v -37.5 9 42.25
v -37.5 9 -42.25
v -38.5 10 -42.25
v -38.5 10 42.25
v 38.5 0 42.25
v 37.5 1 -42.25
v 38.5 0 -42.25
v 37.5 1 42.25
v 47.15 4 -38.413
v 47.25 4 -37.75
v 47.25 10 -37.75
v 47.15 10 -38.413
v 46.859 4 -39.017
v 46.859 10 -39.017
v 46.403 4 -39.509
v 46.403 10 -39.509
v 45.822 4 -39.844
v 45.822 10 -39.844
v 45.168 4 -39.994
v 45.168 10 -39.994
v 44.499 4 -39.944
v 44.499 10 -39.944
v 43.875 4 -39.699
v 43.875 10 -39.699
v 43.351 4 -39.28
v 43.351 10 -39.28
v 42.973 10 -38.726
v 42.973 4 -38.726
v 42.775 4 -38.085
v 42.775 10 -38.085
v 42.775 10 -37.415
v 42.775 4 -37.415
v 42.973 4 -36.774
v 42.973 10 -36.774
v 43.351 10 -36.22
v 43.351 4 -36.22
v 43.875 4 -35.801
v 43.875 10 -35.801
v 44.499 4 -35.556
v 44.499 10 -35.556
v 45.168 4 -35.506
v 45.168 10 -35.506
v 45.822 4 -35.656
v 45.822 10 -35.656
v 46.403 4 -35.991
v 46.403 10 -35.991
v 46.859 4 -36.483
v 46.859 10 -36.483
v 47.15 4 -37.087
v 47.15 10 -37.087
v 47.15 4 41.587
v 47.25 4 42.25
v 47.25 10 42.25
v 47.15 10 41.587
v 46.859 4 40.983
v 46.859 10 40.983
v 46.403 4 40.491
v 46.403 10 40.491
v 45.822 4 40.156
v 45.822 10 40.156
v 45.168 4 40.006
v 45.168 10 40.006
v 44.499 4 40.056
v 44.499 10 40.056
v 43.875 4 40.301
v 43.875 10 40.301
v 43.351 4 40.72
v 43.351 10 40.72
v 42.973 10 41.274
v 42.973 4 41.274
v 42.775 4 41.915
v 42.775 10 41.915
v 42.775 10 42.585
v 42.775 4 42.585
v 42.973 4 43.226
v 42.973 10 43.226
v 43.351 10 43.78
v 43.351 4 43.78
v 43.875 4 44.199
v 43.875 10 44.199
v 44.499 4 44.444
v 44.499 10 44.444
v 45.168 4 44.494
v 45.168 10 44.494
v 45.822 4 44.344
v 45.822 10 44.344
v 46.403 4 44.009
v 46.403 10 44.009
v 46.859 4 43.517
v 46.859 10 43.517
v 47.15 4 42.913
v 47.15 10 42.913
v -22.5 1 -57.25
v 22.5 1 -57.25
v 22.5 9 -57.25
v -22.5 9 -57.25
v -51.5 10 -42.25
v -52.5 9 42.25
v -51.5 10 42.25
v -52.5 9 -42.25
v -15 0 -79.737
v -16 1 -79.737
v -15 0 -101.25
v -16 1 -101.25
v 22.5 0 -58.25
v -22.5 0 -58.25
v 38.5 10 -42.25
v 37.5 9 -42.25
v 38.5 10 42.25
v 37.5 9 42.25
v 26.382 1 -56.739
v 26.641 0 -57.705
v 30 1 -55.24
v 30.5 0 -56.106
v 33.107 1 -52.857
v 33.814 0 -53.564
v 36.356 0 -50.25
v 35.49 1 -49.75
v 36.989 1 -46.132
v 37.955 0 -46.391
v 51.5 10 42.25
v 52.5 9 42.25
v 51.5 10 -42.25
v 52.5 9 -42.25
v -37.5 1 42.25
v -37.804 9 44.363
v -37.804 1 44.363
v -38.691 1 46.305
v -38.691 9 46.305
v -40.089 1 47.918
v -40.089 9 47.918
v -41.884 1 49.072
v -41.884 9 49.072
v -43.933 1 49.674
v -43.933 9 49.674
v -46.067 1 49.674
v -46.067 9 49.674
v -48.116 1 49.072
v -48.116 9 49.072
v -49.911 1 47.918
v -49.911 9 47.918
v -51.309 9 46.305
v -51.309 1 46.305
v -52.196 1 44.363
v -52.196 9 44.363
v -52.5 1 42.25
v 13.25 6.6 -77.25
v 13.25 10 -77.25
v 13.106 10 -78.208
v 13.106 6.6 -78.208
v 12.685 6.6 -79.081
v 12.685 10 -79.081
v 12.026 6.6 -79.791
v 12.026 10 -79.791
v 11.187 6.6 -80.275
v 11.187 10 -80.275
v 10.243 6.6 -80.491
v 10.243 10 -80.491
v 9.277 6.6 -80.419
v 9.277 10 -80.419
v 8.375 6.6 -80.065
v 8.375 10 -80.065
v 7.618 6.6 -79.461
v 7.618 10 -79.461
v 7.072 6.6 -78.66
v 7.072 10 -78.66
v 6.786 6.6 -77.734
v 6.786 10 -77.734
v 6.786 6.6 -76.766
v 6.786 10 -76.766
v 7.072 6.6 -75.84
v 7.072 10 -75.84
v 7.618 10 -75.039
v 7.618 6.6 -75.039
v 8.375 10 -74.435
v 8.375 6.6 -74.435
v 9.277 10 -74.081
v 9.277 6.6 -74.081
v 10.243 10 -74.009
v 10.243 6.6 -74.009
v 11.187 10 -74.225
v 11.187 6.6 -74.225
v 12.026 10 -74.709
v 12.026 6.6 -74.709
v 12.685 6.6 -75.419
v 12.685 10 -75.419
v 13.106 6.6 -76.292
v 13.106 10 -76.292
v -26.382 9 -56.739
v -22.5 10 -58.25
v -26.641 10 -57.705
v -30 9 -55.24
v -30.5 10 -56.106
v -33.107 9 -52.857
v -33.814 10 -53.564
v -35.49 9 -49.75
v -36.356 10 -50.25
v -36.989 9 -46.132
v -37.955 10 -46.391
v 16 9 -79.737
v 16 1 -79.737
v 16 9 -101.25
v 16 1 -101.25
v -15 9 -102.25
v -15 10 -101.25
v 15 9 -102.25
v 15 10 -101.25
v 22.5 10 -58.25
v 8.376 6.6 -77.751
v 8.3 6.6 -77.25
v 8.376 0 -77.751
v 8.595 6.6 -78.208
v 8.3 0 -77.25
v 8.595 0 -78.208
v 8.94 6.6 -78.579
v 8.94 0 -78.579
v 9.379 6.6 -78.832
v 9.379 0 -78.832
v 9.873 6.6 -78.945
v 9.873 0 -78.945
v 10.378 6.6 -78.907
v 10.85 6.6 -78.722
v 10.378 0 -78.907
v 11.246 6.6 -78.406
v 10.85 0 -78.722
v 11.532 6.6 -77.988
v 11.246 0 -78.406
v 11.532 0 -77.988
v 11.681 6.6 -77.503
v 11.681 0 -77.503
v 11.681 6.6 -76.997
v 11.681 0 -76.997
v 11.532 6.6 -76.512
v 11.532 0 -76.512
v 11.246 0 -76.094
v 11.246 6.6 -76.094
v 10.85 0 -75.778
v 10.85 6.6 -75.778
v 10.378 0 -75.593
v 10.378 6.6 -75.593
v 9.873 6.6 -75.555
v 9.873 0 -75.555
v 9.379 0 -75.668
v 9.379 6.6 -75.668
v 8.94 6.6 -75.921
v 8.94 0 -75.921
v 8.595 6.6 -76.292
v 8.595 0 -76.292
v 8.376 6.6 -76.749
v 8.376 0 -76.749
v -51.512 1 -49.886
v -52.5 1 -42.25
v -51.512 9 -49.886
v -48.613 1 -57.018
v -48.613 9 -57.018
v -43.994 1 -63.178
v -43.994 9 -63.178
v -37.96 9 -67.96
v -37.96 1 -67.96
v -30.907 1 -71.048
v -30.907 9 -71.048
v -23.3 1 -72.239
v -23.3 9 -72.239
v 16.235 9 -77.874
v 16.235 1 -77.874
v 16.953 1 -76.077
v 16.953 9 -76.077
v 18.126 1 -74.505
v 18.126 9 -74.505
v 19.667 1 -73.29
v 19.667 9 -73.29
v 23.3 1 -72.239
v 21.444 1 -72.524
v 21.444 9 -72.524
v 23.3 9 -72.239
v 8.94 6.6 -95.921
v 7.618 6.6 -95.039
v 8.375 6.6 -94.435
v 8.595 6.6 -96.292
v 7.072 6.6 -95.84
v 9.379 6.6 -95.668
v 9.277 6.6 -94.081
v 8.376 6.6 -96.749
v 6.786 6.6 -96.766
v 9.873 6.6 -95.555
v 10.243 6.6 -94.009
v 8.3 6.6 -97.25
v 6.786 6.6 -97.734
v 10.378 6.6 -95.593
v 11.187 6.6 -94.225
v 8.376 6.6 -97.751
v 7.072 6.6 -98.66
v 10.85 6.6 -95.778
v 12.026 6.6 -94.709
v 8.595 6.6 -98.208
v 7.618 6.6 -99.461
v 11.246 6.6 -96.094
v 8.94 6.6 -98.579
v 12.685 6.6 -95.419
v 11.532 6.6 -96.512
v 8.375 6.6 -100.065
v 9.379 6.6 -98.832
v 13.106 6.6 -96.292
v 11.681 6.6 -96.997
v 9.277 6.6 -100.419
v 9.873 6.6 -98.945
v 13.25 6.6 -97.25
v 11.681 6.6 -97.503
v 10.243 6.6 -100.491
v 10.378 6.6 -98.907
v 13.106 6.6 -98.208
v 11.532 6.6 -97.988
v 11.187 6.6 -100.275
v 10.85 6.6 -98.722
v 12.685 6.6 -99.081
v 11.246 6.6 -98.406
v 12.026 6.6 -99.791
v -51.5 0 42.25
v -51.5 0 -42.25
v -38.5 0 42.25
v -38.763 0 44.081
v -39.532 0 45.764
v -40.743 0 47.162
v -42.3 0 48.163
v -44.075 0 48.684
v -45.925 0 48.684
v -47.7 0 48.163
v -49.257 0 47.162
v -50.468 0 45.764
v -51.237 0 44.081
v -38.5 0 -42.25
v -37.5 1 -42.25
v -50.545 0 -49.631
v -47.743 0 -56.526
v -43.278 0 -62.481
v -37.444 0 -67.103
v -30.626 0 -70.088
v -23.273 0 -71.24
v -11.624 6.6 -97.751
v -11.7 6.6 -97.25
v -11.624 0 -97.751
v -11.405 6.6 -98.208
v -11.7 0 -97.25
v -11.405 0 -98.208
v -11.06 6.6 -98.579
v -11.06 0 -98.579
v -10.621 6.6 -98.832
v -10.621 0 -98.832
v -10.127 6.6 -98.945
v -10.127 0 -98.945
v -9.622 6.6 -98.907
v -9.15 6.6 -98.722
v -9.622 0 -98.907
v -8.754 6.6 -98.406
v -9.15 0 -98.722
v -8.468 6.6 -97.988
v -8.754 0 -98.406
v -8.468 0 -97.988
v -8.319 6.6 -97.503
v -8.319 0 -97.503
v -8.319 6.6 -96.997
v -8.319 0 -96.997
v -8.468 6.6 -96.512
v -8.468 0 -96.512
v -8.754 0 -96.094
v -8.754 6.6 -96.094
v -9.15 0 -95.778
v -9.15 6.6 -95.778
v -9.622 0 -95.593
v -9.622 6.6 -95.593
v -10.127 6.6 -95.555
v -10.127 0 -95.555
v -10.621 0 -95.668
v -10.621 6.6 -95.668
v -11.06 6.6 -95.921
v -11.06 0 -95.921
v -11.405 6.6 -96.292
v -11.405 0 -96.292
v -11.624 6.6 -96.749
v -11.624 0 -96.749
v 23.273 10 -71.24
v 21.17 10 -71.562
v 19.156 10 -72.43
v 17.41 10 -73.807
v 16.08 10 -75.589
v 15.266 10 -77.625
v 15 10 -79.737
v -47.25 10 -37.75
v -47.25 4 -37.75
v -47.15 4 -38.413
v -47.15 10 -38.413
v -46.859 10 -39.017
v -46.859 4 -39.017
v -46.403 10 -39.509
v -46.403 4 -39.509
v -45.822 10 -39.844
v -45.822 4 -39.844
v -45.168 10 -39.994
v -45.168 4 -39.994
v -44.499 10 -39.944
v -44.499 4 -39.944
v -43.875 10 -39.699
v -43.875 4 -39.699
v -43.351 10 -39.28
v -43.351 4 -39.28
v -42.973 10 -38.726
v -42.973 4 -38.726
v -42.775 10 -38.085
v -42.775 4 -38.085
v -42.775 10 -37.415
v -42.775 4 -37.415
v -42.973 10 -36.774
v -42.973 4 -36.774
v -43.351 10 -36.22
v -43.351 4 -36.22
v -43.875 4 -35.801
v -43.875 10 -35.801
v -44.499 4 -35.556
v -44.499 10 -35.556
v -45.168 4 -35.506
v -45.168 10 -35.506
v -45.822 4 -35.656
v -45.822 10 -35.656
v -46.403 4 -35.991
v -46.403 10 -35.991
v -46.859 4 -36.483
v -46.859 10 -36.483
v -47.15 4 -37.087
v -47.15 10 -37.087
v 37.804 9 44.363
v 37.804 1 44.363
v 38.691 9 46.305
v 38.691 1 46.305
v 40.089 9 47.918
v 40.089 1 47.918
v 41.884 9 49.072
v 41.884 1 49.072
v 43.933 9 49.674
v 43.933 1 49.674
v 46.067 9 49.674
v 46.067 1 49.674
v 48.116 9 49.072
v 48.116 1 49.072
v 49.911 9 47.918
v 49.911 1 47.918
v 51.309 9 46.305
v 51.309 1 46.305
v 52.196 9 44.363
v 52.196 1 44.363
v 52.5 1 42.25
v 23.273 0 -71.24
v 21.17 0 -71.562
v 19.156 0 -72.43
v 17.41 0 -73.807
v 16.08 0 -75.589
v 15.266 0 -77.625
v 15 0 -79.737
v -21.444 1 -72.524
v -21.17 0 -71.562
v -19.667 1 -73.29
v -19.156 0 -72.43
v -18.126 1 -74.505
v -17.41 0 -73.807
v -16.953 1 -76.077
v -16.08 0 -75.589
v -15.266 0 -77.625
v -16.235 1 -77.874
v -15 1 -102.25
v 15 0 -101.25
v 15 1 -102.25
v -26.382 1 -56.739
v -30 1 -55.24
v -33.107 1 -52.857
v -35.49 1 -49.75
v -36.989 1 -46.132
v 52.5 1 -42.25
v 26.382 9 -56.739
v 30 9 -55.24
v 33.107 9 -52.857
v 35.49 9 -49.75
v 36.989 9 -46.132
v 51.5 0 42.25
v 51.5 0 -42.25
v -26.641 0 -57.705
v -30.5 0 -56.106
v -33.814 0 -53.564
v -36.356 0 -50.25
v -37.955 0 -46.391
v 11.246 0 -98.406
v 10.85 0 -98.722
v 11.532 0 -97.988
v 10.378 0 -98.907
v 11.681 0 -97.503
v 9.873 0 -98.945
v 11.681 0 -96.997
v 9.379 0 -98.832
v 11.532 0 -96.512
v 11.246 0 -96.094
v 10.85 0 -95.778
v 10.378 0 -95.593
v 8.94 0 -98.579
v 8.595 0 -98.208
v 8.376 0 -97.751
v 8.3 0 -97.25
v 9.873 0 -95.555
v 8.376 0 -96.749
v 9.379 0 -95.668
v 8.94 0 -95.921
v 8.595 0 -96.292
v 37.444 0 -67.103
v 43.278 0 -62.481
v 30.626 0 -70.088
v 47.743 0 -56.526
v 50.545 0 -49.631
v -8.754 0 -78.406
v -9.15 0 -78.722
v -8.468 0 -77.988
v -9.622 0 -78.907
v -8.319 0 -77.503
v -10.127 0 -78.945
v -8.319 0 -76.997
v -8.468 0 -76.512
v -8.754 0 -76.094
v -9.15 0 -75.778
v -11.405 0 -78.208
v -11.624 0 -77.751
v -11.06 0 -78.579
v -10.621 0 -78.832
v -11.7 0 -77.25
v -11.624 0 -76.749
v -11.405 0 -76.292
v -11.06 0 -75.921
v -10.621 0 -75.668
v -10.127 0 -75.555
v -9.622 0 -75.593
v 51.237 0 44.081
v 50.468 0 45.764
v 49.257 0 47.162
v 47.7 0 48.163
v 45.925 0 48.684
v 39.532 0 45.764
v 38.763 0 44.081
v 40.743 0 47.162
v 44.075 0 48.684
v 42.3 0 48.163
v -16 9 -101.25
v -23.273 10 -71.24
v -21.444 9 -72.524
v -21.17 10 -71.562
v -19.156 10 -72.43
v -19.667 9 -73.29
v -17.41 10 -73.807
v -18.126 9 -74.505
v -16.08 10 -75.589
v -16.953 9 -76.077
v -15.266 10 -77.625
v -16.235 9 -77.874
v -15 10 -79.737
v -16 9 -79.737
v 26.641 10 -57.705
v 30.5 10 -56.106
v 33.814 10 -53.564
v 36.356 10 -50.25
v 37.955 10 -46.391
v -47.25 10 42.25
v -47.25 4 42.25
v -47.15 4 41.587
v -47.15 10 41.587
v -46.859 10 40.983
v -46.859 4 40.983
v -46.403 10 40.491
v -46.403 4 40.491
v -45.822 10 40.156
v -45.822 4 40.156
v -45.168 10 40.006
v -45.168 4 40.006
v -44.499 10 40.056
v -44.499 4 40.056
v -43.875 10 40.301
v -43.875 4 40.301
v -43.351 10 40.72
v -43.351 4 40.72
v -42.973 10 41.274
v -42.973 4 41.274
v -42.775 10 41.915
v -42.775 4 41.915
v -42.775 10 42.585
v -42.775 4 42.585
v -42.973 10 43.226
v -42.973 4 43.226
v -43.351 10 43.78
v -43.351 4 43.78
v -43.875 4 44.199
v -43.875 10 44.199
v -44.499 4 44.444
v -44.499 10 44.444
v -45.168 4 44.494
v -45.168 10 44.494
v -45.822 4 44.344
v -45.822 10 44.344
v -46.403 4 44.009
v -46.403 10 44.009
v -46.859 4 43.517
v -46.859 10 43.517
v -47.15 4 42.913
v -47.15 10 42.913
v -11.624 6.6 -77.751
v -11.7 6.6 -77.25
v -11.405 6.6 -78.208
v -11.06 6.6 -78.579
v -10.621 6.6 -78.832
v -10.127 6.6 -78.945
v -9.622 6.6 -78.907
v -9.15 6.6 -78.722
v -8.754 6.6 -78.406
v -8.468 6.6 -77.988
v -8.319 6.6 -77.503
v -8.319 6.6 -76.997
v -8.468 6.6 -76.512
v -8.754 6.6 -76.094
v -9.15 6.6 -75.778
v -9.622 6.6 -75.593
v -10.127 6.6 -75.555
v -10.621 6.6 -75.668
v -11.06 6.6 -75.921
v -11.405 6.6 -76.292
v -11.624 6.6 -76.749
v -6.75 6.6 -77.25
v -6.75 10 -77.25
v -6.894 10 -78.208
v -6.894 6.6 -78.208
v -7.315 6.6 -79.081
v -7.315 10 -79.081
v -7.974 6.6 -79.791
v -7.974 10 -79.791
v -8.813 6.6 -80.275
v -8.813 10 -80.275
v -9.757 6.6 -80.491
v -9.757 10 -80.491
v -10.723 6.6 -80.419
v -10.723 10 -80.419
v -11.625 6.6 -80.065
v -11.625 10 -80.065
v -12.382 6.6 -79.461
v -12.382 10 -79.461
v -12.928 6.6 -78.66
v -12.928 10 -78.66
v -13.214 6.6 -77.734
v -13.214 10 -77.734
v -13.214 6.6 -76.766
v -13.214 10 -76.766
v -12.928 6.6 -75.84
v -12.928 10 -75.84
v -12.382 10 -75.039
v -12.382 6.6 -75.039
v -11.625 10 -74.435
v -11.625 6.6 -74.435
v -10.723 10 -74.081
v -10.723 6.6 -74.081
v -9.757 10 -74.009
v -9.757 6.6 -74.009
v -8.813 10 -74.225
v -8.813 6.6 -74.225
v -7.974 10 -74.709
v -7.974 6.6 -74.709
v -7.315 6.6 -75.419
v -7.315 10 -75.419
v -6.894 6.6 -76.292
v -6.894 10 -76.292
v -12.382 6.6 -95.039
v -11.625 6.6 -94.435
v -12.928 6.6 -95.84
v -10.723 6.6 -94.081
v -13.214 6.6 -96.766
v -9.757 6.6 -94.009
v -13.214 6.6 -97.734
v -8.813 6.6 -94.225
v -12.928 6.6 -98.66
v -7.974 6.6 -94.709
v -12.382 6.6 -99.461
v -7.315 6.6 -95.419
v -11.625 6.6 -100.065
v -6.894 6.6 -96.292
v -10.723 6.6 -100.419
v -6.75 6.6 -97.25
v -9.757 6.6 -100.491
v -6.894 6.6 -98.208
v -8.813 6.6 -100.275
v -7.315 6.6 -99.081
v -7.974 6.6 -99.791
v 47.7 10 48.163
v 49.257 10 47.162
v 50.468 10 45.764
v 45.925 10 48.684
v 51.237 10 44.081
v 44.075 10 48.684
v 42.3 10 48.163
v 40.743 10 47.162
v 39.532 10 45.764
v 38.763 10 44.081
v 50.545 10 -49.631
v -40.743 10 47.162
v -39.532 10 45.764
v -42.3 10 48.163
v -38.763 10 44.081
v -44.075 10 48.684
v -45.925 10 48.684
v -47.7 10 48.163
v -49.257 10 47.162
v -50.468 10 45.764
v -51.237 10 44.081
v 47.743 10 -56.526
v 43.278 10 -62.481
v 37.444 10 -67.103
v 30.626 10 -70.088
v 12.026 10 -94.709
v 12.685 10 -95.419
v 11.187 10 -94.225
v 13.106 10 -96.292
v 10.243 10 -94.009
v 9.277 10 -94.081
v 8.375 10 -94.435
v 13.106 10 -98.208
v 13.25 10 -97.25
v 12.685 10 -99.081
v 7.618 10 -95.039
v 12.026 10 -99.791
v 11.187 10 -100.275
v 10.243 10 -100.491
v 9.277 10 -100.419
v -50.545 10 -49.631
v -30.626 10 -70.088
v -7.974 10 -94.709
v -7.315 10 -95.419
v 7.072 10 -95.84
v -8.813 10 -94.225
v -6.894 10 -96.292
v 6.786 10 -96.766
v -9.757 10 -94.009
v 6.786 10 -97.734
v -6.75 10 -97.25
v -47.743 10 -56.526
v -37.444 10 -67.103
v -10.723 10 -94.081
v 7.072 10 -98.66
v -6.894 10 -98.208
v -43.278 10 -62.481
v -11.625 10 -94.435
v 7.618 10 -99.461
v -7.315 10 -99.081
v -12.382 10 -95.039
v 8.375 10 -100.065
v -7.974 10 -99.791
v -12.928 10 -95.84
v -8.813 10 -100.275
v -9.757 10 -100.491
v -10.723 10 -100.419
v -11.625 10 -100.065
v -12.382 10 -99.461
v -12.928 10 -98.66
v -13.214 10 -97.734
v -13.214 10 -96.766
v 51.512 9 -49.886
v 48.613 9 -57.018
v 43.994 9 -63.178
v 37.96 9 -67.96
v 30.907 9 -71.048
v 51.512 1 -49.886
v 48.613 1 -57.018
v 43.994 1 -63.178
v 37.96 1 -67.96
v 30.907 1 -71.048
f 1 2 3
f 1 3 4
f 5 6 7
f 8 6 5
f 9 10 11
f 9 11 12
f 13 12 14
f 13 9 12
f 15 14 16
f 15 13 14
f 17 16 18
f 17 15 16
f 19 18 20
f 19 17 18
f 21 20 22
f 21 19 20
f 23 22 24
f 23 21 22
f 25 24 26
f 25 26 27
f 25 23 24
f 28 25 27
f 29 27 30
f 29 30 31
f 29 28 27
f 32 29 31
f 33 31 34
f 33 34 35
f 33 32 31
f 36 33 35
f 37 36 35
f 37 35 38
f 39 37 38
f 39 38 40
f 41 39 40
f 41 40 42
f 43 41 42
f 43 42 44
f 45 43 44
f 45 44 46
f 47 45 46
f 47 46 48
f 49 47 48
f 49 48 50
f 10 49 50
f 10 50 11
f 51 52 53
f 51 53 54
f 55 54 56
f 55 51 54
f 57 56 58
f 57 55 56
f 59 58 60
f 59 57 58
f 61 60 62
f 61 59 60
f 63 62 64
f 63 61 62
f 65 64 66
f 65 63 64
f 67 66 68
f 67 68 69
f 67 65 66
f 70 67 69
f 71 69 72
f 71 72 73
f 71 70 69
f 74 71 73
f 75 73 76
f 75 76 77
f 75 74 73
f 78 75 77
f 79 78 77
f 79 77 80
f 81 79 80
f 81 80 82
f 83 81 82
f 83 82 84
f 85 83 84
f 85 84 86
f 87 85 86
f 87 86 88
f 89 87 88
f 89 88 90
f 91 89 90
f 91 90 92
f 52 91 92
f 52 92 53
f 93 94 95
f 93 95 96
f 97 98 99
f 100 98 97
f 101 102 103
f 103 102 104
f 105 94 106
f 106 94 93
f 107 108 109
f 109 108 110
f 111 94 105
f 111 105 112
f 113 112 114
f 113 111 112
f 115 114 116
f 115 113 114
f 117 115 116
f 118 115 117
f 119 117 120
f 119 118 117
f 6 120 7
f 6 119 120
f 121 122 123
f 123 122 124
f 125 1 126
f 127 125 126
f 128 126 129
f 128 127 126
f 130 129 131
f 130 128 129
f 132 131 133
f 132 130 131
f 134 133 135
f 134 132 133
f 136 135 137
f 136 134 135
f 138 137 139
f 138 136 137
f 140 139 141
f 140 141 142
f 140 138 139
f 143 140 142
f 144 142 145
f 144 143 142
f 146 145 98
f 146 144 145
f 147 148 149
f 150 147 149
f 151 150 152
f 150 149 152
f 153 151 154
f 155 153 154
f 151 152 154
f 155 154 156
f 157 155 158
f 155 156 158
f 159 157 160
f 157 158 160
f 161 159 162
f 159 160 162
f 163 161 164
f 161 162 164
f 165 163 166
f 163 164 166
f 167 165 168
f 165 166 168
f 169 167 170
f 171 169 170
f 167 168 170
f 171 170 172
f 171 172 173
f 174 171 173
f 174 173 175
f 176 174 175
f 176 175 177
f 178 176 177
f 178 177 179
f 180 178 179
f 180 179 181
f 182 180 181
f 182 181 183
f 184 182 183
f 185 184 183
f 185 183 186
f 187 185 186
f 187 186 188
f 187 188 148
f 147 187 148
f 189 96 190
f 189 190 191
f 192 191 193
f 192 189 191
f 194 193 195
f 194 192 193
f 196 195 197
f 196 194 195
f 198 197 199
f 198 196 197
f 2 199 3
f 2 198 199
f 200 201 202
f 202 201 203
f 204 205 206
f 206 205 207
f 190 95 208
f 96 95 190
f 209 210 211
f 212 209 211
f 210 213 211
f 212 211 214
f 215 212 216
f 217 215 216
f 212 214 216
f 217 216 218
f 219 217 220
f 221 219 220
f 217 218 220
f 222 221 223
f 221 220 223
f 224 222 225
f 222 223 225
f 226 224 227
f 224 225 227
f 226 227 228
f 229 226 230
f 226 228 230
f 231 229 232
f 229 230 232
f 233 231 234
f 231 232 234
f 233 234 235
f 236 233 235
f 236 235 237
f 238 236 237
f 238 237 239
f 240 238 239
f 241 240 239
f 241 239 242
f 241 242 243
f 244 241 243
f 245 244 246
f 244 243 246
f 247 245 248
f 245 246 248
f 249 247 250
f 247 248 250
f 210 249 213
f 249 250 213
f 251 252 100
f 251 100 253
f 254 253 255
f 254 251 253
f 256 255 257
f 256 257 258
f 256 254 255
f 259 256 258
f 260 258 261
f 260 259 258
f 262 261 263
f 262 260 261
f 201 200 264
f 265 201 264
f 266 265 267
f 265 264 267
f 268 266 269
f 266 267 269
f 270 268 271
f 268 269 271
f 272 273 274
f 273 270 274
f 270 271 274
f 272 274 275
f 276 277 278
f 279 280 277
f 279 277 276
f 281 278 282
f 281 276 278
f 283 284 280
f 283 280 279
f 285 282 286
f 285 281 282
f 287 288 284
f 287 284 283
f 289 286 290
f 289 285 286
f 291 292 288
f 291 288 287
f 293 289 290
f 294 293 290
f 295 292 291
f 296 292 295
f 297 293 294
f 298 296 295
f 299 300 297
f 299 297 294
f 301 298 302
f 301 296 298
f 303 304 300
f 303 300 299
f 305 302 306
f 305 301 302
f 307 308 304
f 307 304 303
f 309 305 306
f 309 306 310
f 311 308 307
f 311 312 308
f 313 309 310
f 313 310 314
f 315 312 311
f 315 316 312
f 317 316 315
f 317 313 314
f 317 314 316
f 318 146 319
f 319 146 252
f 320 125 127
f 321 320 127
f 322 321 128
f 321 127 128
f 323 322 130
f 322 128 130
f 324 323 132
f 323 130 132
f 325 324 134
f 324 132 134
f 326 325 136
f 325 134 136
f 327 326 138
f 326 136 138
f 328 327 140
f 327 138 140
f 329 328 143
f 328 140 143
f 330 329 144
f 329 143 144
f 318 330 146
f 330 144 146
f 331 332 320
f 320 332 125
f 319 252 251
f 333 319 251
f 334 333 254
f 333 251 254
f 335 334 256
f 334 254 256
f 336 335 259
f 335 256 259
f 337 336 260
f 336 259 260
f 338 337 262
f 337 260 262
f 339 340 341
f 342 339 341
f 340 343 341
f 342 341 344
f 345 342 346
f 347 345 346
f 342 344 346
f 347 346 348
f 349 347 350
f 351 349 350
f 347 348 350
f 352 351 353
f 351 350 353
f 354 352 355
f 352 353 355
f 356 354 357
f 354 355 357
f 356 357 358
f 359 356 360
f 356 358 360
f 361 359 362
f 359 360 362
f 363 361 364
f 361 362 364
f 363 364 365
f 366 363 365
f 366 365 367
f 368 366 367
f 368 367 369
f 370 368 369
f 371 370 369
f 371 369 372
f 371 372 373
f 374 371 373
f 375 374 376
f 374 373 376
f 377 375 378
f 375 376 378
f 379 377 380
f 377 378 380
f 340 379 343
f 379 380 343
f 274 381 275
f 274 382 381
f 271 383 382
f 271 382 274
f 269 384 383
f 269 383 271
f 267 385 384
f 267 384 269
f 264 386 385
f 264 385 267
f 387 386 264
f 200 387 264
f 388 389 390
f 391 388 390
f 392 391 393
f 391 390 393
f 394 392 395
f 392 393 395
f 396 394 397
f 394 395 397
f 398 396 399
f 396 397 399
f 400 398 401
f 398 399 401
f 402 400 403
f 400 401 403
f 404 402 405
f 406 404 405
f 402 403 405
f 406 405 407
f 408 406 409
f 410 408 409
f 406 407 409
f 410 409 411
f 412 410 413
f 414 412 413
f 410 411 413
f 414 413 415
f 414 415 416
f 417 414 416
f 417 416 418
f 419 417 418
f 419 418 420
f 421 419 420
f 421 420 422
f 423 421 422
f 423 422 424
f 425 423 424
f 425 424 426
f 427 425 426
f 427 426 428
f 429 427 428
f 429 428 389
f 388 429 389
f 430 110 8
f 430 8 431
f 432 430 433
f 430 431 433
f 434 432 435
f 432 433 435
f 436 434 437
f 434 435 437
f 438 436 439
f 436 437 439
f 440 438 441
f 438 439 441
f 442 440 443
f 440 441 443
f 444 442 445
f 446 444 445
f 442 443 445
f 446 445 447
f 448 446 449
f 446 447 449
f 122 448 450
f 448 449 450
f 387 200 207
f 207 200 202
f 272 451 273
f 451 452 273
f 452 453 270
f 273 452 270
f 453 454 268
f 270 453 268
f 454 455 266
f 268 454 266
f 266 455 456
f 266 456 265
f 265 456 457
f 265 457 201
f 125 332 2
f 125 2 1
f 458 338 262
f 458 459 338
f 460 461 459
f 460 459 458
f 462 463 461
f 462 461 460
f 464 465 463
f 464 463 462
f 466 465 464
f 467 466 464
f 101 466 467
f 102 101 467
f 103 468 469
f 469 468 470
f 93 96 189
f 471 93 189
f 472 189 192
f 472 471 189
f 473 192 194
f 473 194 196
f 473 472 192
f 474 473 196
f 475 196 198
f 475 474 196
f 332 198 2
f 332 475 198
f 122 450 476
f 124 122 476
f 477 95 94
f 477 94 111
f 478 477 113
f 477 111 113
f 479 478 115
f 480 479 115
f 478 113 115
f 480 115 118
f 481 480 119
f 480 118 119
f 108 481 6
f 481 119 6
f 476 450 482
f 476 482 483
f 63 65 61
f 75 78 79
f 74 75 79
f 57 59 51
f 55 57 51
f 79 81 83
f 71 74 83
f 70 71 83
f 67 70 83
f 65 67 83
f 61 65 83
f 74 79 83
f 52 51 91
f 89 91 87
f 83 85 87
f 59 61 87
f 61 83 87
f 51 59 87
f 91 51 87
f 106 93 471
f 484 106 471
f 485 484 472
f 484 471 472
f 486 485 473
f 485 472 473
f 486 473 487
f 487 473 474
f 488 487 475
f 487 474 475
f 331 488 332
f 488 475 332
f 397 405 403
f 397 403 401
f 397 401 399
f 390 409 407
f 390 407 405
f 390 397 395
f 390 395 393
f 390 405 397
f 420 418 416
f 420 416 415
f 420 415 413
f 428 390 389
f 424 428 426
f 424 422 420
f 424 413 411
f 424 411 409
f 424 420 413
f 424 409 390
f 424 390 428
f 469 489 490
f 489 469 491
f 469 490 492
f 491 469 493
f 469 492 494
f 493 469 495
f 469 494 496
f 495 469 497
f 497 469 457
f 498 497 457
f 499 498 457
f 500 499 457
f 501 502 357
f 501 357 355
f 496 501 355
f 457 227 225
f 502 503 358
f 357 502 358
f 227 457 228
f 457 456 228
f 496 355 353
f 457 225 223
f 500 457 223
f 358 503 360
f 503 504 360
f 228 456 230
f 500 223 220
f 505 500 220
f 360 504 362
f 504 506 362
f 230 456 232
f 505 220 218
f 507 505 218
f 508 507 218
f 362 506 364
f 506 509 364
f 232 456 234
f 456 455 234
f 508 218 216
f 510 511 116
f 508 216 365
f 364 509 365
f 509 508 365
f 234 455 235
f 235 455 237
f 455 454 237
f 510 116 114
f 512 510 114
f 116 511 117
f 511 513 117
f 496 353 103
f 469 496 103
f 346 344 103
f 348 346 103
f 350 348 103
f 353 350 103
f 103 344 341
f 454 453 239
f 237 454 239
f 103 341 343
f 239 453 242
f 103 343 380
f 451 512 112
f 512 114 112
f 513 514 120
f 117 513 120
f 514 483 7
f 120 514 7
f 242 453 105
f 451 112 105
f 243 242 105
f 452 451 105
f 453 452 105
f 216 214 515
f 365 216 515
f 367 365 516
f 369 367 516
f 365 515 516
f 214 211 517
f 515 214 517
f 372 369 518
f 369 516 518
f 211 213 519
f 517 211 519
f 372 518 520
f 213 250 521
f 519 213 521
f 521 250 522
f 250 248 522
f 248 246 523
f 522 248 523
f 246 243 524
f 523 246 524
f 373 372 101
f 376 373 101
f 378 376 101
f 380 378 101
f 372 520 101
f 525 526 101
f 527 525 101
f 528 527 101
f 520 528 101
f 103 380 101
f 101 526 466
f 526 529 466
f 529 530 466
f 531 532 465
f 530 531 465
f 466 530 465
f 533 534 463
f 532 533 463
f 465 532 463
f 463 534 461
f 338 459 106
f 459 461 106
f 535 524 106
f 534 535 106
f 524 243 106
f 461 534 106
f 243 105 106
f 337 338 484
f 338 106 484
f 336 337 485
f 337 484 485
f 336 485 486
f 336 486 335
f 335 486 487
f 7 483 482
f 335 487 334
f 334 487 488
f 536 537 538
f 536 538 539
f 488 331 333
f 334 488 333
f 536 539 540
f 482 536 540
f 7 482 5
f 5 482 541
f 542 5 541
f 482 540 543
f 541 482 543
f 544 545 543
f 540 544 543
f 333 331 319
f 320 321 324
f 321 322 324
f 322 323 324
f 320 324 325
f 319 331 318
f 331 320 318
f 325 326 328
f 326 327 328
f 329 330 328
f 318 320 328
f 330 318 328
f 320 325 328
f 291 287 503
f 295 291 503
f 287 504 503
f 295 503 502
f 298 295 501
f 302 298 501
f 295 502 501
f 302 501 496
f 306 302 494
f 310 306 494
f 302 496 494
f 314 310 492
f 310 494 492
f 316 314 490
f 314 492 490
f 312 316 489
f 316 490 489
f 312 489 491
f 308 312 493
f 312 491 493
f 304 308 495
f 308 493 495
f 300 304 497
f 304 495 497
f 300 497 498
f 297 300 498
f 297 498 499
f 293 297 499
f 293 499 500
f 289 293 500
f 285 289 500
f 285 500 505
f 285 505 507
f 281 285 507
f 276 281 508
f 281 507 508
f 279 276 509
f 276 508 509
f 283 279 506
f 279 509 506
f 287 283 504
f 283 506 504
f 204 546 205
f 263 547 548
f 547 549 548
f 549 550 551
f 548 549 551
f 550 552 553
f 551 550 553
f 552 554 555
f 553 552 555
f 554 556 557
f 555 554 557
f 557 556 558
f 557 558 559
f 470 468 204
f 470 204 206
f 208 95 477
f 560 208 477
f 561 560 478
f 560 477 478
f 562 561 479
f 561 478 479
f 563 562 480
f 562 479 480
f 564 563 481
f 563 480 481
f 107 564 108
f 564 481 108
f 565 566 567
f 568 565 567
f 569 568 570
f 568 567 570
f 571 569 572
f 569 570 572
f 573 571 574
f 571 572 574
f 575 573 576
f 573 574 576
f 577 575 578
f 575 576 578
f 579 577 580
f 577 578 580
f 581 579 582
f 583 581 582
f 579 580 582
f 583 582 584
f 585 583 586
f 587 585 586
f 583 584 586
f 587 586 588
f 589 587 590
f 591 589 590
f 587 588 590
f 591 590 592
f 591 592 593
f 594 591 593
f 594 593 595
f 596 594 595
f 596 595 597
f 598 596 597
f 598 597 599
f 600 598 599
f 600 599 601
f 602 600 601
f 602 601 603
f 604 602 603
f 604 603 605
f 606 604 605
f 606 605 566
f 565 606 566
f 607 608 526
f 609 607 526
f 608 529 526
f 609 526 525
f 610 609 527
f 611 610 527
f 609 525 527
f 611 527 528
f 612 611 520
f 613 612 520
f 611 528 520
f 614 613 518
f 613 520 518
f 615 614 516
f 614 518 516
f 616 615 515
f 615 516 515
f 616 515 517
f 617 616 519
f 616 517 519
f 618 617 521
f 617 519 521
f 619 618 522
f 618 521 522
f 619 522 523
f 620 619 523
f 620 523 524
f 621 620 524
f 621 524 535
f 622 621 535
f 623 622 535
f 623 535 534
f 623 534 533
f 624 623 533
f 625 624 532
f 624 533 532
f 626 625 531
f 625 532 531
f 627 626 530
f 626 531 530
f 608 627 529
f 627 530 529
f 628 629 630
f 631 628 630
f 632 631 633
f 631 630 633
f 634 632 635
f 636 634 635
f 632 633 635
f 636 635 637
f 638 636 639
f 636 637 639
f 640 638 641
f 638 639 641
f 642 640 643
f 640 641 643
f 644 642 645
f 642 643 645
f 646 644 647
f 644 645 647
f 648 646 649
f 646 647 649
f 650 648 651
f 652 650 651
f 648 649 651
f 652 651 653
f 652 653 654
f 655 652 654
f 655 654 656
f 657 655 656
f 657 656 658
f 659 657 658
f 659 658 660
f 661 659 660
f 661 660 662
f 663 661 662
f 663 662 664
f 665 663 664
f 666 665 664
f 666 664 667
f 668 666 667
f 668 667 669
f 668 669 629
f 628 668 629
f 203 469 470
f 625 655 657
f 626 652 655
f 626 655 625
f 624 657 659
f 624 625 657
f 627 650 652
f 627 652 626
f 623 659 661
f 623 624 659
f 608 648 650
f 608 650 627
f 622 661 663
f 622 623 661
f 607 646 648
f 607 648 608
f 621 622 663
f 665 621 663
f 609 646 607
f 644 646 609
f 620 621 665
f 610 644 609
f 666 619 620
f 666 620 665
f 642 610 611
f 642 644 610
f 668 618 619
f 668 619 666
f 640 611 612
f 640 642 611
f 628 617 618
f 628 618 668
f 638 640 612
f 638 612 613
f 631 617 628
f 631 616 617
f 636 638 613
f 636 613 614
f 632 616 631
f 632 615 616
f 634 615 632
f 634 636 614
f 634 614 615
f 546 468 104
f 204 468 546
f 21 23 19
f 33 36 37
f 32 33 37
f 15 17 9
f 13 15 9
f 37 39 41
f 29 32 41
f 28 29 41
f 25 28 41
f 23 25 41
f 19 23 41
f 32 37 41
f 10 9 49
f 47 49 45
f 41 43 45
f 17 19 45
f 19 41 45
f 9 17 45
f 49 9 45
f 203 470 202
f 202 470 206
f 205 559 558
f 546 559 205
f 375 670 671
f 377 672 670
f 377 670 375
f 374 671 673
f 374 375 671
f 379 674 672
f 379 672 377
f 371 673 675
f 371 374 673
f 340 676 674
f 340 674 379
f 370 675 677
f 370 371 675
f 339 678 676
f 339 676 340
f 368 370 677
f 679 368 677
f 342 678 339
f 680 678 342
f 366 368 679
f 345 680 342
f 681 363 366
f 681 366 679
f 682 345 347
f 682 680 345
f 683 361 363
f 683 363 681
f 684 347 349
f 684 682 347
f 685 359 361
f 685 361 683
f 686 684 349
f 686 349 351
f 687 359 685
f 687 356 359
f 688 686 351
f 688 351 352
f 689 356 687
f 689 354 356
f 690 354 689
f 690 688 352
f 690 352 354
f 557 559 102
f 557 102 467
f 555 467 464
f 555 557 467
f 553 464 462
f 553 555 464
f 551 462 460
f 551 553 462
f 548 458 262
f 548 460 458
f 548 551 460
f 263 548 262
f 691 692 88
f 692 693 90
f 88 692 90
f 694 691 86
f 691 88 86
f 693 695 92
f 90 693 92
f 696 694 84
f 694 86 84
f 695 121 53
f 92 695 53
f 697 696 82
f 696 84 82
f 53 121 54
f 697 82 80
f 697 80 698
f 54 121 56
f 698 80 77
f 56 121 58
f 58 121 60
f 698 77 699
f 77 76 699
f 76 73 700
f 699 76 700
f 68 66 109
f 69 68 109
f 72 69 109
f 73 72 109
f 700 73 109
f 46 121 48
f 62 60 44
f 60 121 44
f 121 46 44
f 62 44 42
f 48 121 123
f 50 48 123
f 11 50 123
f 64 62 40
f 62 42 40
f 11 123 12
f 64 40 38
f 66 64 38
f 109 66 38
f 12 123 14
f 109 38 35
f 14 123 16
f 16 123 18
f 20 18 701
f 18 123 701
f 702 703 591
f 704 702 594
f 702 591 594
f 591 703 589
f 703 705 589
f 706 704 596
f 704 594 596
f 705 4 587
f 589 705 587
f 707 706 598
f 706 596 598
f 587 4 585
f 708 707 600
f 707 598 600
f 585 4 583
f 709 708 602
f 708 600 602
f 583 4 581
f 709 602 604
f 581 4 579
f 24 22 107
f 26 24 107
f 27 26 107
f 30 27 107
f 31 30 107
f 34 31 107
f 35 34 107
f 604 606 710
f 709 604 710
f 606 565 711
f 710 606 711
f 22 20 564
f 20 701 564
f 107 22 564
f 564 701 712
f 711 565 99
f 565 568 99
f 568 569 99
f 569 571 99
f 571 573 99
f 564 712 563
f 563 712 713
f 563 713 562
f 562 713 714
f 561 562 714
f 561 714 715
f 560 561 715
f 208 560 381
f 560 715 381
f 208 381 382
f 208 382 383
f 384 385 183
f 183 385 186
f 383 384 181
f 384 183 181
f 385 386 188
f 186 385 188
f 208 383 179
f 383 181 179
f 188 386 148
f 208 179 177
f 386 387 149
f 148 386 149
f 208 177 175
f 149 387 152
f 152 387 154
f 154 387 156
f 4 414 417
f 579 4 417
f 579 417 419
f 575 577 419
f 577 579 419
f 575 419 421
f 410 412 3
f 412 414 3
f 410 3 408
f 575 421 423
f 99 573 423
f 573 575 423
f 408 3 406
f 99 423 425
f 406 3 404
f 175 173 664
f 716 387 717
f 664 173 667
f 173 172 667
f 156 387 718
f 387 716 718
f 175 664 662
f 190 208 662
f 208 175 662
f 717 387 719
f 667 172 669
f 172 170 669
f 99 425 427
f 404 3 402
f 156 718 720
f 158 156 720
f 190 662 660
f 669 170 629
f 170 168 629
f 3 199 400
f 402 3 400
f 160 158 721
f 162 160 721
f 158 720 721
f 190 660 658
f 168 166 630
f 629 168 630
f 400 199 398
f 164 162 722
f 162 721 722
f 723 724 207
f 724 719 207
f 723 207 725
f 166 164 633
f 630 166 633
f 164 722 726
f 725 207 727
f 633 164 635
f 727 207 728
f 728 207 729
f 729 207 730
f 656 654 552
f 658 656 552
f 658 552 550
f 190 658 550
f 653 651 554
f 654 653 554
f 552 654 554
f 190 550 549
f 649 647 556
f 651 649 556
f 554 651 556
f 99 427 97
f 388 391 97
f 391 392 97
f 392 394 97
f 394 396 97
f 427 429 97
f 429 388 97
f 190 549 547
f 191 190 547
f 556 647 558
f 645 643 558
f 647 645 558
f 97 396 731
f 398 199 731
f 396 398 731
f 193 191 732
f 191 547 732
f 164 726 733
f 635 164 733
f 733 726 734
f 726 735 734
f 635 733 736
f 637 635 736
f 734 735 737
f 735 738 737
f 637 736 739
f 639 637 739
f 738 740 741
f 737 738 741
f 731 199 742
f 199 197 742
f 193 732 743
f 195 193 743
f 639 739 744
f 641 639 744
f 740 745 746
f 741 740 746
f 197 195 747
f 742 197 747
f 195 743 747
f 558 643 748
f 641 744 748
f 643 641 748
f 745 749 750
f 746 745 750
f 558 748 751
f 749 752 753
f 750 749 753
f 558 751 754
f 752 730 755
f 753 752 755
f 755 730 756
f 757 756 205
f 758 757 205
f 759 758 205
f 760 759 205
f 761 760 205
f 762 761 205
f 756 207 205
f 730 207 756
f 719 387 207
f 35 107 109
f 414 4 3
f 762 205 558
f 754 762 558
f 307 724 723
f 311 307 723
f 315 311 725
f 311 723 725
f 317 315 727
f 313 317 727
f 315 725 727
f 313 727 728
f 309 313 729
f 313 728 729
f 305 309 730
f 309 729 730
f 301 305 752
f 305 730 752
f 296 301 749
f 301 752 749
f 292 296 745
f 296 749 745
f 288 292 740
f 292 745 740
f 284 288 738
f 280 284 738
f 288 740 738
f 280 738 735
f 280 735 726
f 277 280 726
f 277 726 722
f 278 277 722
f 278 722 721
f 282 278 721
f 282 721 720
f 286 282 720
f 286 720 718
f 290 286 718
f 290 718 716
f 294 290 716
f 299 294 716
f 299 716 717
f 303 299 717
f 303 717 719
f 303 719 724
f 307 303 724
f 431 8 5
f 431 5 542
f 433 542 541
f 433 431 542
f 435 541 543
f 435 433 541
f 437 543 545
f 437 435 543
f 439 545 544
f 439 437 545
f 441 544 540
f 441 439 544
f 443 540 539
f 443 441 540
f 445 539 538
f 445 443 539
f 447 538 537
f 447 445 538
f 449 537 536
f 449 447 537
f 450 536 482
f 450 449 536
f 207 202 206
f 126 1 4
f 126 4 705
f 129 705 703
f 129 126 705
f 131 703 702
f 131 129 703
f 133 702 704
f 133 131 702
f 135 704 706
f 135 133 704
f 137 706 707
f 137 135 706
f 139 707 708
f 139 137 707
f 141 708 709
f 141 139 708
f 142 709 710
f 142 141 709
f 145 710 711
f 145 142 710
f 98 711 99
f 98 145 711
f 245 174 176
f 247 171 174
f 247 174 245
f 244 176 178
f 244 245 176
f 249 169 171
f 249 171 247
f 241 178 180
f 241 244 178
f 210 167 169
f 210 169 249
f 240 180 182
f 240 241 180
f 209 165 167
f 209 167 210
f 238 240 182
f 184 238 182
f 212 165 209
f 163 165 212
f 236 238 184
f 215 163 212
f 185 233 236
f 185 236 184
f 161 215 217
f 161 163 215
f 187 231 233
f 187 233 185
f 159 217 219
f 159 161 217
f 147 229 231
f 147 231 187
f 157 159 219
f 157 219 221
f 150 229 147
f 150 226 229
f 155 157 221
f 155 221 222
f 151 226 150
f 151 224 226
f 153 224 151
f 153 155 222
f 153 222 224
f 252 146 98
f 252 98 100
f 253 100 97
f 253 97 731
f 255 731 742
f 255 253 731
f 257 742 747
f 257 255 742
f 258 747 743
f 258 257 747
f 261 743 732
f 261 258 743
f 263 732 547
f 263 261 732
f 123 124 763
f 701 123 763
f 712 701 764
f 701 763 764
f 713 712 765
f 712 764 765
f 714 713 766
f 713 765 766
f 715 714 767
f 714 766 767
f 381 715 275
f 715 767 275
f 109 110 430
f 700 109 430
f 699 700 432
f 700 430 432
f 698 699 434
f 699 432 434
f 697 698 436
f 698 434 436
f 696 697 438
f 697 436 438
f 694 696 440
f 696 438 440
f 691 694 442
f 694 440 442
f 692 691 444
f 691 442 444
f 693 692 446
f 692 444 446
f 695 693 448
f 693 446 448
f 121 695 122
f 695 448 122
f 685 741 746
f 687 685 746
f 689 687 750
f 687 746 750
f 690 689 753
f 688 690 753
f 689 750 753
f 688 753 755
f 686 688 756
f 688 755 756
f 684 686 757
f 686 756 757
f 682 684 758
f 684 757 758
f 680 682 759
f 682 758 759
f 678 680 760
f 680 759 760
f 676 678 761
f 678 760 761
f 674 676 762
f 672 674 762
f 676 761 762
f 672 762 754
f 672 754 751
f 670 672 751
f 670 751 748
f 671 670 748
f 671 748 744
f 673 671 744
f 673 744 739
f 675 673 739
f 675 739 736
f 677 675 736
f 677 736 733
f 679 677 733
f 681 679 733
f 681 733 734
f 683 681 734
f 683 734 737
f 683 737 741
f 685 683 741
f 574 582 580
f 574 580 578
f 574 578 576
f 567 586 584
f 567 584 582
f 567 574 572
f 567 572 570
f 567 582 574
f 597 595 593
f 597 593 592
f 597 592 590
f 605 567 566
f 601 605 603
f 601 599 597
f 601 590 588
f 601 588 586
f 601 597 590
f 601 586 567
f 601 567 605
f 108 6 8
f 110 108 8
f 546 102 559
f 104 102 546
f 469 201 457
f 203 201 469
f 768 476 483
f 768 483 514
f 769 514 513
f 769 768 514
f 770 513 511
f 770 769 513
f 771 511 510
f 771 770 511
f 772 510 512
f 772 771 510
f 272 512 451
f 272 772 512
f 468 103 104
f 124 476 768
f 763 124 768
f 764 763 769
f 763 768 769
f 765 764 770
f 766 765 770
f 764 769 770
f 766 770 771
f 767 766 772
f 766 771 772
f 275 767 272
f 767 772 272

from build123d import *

# Parameters (mm, degrees)
SKETCH1_R                                           = 2.25
BOSS_EXTRUDE1_DEPTH                                 = 10
FILLET1_R                                           = 7.5
CHAMFER1_SIZE                                       = 1
SKETCH5_R                                           = 2.25
BOSS_EXTRUDE2_DEPTH                                 = 4
CBORE_FOR_M3_HEX_SOCKET_HEAD_CAP_SCREW1_D           = 3.4
CBORE_FOR_M3_HEX_SOCKET_HEAD_CAP_SCREW1_CBORE_D     = 6.5
CBORE_FOR_M3_HEX_SOCKET_HEAD_CAP_SCREW1_CBORE_DEPTH = 3.4


with BuildPart() as part:
    # Sketch1 → Boss-Extrude1 (new body)
    with BuildSketch(Plane(origin=(0, 0, 0), x_dir=(1, 0, 0), z_dir=(0, 1, 0))):
        with BuildLine():
            Line((0, 57.25), (22.5, 57.25))
            ThreePointArc((22.5, 57.25), (33.106601718, 52.856601718), (37.5, 42.25))
            Line((37.5, 42.25), (37.5, -42.25))
            ThreePointArc((37.5, -42.25), (45, -49.75), (52.5, -42.25))
            Line((52.5, -42.25), (52.5, 42.25))
            ThreePointArc((52.5, 42.25), (43.713203436, 63.463203436), (22.5, 72.25))
            Line((22.5, 72.25), (16, 72.25))
            Line((16, 72.25), (16, 102.25))
            Line((16, 102.25), (0, 102.25))
            Line((0, 102.25), (0, 57.25))
        make_face()
        with Locations((45, -42.25)):
            Circle(SKETCH1_R, mode=Mode.SUBTRACT)
        with Locations((45, 37.75)):
            Circle(SKETCH1_R, mode=Mode.SUBTRACT)
    extrude(amount=BOSS_EXTRUDE1_DEPTH)

    # Fillet1
    fillet1_edges = [part.edges().sort_by_distance(p)[0] for p in [
        (16, 5, -72.25),
    ]]
    fillet(fillet1_edges, radius=FILLET1_R)

    # Chamfer1
    chamfer1_edges = [part.edges().sort_by_distance(p)[0] for p in [
        (8, 0, -102.25),
        (43.99418526, 0, -63.178449536),
        (52.5, 0, 0),
        (45, 0, 49.75),
        (37.5, 0, 0),
        (33.106601718, 10, -52.856601718),
        (33.106601718, 0, -52.856601718),
        (11.25, 0, -57.25),
        (37.5, 10, 0),
        (16, 5, -102.25),
        (45, 10, 49.75),
        (52.5, 10, 0),
        (43.99418526, 10, -63.178449536),
        (16, 0, -90.993332148),
        (16, 10, -90.993332148),
        (8, 10, -102.25),
        (18.126453685, 0, -74.504551911),
        (18.126453685, 10, -74.504551911),
        (11.25, 10, -57.25),
    ]]
    chamfer(chamfer1_edges, length=CHAMFER1_SIZE)

    # Sketch5 → Boss-Extrude2 (add)
    with BuildSketch(Plane.XZ):
        with Locations((45, -37.75)):
            Circle(SKETCH5_R)
        with Locations((45, 42.25)):
            Circle(SKETCH5_R)
    extrude(amount=-BOSS_EXTRUDE2_DEPTH)

    # Mirror1: part across plane


with BuildPart() as part_1:
    add(part.part)
    add(part.part.mirror(Plane(origin=(0, 10, -57.25), x_dir=(0, 0, 1), z_dir=(1, 0, 0))))

    # CBORE for M3 Hex Socket Head Cap Screw1 (through all)
    with Locations(Plane(origin=(0, 10, 0), x_dir=(1, 0, 0), z_dir=(0, 1, 0))):
        with Locations((10, 97.25), (-10, 97.25), (-10, 77.25), (10, 77.25)):
            CounterBoreHole(CBORE_FOR_M3_HEX_SOCKET_HEAD_CAP_SCREW1_D / 2, CBORE_FOR_M3_HEX_SOCKET_HEAD_CAP_SCREW1_CBORE_D / 2, CBORE_FOR_M3_HEX_SOCKET_HEAD_CAP_SCREW1_CBORE_DEPTH)


solid = part_1.part
